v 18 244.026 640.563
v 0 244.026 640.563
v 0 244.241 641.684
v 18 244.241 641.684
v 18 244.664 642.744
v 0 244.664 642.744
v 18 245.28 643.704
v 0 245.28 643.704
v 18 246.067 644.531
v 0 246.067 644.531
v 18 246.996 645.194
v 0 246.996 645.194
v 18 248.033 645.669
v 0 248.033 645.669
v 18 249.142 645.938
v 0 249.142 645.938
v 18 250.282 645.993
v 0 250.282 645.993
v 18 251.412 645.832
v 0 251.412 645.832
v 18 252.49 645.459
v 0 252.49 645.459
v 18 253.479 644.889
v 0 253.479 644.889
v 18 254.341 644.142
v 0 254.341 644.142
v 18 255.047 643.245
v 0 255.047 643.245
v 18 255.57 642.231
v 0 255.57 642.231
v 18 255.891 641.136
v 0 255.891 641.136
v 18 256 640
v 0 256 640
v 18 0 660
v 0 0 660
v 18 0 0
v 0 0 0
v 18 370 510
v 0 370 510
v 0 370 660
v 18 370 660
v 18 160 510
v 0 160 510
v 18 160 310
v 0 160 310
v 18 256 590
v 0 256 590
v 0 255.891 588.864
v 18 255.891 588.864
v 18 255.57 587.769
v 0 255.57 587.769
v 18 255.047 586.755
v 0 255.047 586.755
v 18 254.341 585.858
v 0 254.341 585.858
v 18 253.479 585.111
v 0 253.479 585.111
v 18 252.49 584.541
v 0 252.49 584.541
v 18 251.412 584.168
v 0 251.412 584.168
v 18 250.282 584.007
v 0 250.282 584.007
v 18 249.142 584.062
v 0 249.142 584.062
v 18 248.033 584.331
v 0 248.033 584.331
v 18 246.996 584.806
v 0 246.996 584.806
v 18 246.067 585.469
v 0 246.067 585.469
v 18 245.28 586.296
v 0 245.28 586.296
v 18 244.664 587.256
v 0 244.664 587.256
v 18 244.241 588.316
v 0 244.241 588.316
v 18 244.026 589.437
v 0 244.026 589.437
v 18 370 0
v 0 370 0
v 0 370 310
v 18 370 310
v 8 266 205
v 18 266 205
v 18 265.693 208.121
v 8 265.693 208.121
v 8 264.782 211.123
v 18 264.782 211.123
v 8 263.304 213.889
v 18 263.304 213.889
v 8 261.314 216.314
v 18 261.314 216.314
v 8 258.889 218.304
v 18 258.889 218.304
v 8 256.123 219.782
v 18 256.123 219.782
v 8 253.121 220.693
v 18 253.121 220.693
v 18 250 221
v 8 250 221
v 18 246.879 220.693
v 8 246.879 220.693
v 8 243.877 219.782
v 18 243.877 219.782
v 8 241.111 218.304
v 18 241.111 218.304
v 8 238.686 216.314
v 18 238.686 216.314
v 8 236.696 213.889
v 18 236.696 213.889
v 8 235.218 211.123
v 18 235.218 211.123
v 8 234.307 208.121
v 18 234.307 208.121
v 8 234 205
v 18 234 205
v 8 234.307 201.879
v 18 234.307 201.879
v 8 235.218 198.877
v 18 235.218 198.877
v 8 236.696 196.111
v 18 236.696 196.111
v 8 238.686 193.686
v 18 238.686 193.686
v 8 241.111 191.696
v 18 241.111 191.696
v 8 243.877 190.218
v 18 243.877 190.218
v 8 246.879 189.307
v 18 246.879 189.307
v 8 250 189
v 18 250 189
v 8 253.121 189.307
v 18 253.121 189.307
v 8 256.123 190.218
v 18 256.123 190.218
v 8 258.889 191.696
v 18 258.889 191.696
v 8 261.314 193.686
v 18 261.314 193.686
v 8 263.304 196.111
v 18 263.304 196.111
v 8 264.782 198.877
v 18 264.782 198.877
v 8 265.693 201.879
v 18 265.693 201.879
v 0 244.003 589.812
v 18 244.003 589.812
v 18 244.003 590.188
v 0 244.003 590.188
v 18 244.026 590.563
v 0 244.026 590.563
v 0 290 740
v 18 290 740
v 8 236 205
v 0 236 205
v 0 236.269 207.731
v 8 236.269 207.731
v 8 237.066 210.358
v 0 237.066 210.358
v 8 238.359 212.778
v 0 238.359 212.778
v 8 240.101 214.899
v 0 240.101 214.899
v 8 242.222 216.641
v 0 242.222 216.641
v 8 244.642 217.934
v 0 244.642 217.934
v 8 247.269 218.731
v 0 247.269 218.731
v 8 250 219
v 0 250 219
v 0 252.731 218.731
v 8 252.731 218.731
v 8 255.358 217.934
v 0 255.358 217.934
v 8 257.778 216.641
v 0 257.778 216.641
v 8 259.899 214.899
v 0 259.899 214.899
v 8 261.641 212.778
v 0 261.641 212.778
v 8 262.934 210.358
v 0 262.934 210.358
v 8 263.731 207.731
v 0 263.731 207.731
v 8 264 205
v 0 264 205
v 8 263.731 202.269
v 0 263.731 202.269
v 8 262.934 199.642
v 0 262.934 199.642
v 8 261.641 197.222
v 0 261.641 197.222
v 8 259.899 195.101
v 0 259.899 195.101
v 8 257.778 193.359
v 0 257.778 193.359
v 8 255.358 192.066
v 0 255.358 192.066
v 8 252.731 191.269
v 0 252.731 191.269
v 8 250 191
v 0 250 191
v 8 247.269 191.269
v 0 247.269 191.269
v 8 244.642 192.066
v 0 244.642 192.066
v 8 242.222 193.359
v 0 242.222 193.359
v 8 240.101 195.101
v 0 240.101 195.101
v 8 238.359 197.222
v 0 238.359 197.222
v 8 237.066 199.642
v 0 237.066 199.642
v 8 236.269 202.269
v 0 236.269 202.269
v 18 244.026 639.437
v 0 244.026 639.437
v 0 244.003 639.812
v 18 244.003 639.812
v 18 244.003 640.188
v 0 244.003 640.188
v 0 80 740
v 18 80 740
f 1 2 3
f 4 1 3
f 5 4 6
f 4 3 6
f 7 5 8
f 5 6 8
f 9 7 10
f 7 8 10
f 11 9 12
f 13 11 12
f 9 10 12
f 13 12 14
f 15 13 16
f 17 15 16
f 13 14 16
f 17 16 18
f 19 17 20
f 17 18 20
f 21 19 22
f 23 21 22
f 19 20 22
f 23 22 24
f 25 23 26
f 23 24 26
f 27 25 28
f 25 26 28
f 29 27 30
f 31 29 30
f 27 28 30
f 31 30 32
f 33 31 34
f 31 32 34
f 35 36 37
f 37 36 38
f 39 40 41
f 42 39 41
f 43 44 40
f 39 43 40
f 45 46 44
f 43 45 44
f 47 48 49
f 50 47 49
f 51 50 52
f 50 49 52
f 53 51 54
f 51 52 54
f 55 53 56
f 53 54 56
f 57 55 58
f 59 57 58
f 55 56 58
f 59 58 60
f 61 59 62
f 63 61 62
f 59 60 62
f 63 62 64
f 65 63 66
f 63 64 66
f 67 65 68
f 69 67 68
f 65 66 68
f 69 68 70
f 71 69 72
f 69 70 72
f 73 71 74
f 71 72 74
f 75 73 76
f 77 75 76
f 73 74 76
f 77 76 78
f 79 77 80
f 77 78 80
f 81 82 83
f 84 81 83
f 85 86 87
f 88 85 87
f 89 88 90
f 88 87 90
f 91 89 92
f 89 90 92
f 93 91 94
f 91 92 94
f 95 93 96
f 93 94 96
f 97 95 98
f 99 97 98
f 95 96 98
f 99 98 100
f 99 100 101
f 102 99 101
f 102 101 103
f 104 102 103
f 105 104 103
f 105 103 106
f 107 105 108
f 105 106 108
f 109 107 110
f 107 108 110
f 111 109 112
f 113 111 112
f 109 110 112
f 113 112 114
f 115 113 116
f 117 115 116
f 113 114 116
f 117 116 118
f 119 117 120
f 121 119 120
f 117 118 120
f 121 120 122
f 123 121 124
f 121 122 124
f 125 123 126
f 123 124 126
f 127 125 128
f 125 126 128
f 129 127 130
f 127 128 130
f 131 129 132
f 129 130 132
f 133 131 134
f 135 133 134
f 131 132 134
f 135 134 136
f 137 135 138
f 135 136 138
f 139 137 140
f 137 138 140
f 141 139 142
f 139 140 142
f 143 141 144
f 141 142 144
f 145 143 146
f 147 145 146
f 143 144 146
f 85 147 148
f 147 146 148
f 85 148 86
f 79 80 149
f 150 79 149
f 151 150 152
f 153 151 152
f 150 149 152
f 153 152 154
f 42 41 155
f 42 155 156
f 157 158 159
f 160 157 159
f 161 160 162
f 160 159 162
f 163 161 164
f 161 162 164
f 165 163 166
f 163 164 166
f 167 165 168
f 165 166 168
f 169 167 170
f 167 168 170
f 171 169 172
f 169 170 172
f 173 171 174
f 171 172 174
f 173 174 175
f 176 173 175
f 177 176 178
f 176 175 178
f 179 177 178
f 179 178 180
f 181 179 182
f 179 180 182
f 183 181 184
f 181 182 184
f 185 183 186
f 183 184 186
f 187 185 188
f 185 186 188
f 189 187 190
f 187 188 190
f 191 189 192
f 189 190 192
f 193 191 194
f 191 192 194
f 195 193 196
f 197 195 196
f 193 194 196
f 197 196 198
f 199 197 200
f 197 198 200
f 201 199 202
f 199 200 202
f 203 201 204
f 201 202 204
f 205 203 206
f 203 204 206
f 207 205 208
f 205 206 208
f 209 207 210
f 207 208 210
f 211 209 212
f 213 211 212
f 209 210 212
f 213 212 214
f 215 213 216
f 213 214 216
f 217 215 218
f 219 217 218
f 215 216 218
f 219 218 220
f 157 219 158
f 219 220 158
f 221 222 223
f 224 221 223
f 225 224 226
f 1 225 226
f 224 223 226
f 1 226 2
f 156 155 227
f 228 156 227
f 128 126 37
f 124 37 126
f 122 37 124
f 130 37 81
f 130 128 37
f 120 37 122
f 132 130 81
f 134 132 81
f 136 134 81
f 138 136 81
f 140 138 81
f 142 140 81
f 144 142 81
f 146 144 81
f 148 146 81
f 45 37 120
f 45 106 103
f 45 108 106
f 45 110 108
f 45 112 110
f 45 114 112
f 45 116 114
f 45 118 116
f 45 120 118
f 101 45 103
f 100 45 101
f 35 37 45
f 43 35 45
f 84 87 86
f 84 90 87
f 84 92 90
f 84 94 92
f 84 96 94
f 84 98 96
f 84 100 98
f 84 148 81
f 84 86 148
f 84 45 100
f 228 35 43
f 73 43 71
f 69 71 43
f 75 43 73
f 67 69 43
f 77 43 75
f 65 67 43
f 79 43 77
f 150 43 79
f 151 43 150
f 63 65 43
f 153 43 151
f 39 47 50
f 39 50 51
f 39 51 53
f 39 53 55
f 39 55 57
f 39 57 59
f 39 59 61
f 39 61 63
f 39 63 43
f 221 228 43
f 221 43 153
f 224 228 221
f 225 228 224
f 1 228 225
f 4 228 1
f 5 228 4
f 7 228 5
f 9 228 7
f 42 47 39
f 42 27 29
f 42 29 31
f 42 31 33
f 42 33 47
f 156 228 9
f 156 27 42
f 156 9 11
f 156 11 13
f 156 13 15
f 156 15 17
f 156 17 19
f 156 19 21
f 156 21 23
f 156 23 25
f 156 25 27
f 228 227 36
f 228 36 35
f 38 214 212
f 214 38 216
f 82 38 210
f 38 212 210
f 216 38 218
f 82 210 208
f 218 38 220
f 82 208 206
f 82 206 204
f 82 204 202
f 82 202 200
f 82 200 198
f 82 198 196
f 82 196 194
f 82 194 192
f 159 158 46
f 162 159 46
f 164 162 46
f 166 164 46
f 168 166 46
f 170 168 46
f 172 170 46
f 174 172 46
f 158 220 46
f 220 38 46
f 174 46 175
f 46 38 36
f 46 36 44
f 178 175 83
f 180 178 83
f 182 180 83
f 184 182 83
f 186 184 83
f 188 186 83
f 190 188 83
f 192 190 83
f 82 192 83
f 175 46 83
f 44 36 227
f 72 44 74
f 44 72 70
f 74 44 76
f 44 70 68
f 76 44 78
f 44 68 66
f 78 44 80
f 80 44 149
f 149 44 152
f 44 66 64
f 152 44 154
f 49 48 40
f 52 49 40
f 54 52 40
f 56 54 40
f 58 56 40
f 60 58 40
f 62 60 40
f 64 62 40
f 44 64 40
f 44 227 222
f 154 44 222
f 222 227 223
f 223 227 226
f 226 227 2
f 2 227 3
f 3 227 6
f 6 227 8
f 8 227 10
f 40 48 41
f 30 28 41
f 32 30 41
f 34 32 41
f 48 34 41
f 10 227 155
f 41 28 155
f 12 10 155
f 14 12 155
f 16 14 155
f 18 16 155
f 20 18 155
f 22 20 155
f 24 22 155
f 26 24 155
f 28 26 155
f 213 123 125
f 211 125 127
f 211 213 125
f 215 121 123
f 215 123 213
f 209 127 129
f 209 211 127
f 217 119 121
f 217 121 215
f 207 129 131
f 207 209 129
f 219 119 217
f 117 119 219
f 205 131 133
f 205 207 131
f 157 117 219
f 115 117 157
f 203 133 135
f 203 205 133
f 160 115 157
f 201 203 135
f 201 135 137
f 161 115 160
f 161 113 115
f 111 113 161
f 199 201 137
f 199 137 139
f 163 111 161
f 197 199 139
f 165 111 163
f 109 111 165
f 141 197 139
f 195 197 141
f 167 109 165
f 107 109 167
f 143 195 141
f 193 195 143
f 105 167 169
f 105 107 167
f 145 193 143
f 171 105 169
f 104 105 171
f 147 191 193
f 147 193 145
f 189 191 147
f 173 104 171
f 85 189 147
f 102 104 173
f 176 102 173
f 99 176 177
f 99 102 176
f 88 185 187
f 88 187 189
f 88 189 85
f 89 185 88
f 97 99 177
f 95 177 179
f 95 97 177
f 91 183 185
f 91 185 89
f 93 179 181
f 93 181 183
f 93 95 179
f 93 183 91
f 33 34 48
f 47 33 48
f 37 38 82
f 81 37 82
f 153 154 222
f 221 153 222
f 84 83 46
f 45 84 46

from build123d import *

# Parameters (mm, degrees)
F0_R     = 6
F1_DEPTH = 18
F2_SIZE  = 80
F3_R     = 16
F4_DEPTH = 10
F5_R     = 14
F6_DEPTH = 8


with BuildPart() as f1:
    # F0 (on Right) → F1 (new body)
    with BuildSketch(Plane.YZ):
        Polygon((0, 740), (0, 0), (370, 0), (370, 310), (160, 310), (160, 510), (370, 510), (370, 740), align=None)
        with Locations((250, 205)):
            Circle(F0_R, mode=Mode.SUBTRACT)
        with BuildLine():
            ThreePointArc((244.026492, 640.563206), (250.281914, 645.993373), (256, 640))
            Line((256, 640), (256, 590))
            ThreePointArc((256, 590), (250.281914, 584.006627), (244.026492, 589.436794))
            ThreePointArc((244.026492, 589.436794), (244, 590), (244.026492, 590.563206))
            Line((244.026492, 590.563206), (244.026492, 639.436794))
            ThreePointArc((244.026492, 639.436794), (244, 640), (244.026492, 640.563206))
        make_face(mode=Mode.SUBTRACT)
    extrude(amount=F1_DEPTH)

    # F2
    f2_edges = [f1.edges().sort_by_distance(p)[0] for p in [
        (9, 0, 740),
        (9, 370, 740),
    ]]
    chamfer(f2_edges, length=F2_SIZE)

    # F3 (on face) → F4 (cut)
    with BuildSketch(Plane.YZ.offset(18)):
        with Locations((250, 205)):
            Circle(F3_R)
    extrude(amount=-F4_DEPTH, mode=Mode.SUBTRACT)

    # F5 (on face) → F6 (cut)
    with BuildSketch(Plane(origin=(0, 0, 0), x_dir=(0, -1, 0), z_dir=(-1, 0, 0))):
        with Locations((-250, 205)):
            Circle(F5_R)
    extrude(amount=-F6_DEPTH, mode=Mode.SUBTRACT)


solid = f1.part
